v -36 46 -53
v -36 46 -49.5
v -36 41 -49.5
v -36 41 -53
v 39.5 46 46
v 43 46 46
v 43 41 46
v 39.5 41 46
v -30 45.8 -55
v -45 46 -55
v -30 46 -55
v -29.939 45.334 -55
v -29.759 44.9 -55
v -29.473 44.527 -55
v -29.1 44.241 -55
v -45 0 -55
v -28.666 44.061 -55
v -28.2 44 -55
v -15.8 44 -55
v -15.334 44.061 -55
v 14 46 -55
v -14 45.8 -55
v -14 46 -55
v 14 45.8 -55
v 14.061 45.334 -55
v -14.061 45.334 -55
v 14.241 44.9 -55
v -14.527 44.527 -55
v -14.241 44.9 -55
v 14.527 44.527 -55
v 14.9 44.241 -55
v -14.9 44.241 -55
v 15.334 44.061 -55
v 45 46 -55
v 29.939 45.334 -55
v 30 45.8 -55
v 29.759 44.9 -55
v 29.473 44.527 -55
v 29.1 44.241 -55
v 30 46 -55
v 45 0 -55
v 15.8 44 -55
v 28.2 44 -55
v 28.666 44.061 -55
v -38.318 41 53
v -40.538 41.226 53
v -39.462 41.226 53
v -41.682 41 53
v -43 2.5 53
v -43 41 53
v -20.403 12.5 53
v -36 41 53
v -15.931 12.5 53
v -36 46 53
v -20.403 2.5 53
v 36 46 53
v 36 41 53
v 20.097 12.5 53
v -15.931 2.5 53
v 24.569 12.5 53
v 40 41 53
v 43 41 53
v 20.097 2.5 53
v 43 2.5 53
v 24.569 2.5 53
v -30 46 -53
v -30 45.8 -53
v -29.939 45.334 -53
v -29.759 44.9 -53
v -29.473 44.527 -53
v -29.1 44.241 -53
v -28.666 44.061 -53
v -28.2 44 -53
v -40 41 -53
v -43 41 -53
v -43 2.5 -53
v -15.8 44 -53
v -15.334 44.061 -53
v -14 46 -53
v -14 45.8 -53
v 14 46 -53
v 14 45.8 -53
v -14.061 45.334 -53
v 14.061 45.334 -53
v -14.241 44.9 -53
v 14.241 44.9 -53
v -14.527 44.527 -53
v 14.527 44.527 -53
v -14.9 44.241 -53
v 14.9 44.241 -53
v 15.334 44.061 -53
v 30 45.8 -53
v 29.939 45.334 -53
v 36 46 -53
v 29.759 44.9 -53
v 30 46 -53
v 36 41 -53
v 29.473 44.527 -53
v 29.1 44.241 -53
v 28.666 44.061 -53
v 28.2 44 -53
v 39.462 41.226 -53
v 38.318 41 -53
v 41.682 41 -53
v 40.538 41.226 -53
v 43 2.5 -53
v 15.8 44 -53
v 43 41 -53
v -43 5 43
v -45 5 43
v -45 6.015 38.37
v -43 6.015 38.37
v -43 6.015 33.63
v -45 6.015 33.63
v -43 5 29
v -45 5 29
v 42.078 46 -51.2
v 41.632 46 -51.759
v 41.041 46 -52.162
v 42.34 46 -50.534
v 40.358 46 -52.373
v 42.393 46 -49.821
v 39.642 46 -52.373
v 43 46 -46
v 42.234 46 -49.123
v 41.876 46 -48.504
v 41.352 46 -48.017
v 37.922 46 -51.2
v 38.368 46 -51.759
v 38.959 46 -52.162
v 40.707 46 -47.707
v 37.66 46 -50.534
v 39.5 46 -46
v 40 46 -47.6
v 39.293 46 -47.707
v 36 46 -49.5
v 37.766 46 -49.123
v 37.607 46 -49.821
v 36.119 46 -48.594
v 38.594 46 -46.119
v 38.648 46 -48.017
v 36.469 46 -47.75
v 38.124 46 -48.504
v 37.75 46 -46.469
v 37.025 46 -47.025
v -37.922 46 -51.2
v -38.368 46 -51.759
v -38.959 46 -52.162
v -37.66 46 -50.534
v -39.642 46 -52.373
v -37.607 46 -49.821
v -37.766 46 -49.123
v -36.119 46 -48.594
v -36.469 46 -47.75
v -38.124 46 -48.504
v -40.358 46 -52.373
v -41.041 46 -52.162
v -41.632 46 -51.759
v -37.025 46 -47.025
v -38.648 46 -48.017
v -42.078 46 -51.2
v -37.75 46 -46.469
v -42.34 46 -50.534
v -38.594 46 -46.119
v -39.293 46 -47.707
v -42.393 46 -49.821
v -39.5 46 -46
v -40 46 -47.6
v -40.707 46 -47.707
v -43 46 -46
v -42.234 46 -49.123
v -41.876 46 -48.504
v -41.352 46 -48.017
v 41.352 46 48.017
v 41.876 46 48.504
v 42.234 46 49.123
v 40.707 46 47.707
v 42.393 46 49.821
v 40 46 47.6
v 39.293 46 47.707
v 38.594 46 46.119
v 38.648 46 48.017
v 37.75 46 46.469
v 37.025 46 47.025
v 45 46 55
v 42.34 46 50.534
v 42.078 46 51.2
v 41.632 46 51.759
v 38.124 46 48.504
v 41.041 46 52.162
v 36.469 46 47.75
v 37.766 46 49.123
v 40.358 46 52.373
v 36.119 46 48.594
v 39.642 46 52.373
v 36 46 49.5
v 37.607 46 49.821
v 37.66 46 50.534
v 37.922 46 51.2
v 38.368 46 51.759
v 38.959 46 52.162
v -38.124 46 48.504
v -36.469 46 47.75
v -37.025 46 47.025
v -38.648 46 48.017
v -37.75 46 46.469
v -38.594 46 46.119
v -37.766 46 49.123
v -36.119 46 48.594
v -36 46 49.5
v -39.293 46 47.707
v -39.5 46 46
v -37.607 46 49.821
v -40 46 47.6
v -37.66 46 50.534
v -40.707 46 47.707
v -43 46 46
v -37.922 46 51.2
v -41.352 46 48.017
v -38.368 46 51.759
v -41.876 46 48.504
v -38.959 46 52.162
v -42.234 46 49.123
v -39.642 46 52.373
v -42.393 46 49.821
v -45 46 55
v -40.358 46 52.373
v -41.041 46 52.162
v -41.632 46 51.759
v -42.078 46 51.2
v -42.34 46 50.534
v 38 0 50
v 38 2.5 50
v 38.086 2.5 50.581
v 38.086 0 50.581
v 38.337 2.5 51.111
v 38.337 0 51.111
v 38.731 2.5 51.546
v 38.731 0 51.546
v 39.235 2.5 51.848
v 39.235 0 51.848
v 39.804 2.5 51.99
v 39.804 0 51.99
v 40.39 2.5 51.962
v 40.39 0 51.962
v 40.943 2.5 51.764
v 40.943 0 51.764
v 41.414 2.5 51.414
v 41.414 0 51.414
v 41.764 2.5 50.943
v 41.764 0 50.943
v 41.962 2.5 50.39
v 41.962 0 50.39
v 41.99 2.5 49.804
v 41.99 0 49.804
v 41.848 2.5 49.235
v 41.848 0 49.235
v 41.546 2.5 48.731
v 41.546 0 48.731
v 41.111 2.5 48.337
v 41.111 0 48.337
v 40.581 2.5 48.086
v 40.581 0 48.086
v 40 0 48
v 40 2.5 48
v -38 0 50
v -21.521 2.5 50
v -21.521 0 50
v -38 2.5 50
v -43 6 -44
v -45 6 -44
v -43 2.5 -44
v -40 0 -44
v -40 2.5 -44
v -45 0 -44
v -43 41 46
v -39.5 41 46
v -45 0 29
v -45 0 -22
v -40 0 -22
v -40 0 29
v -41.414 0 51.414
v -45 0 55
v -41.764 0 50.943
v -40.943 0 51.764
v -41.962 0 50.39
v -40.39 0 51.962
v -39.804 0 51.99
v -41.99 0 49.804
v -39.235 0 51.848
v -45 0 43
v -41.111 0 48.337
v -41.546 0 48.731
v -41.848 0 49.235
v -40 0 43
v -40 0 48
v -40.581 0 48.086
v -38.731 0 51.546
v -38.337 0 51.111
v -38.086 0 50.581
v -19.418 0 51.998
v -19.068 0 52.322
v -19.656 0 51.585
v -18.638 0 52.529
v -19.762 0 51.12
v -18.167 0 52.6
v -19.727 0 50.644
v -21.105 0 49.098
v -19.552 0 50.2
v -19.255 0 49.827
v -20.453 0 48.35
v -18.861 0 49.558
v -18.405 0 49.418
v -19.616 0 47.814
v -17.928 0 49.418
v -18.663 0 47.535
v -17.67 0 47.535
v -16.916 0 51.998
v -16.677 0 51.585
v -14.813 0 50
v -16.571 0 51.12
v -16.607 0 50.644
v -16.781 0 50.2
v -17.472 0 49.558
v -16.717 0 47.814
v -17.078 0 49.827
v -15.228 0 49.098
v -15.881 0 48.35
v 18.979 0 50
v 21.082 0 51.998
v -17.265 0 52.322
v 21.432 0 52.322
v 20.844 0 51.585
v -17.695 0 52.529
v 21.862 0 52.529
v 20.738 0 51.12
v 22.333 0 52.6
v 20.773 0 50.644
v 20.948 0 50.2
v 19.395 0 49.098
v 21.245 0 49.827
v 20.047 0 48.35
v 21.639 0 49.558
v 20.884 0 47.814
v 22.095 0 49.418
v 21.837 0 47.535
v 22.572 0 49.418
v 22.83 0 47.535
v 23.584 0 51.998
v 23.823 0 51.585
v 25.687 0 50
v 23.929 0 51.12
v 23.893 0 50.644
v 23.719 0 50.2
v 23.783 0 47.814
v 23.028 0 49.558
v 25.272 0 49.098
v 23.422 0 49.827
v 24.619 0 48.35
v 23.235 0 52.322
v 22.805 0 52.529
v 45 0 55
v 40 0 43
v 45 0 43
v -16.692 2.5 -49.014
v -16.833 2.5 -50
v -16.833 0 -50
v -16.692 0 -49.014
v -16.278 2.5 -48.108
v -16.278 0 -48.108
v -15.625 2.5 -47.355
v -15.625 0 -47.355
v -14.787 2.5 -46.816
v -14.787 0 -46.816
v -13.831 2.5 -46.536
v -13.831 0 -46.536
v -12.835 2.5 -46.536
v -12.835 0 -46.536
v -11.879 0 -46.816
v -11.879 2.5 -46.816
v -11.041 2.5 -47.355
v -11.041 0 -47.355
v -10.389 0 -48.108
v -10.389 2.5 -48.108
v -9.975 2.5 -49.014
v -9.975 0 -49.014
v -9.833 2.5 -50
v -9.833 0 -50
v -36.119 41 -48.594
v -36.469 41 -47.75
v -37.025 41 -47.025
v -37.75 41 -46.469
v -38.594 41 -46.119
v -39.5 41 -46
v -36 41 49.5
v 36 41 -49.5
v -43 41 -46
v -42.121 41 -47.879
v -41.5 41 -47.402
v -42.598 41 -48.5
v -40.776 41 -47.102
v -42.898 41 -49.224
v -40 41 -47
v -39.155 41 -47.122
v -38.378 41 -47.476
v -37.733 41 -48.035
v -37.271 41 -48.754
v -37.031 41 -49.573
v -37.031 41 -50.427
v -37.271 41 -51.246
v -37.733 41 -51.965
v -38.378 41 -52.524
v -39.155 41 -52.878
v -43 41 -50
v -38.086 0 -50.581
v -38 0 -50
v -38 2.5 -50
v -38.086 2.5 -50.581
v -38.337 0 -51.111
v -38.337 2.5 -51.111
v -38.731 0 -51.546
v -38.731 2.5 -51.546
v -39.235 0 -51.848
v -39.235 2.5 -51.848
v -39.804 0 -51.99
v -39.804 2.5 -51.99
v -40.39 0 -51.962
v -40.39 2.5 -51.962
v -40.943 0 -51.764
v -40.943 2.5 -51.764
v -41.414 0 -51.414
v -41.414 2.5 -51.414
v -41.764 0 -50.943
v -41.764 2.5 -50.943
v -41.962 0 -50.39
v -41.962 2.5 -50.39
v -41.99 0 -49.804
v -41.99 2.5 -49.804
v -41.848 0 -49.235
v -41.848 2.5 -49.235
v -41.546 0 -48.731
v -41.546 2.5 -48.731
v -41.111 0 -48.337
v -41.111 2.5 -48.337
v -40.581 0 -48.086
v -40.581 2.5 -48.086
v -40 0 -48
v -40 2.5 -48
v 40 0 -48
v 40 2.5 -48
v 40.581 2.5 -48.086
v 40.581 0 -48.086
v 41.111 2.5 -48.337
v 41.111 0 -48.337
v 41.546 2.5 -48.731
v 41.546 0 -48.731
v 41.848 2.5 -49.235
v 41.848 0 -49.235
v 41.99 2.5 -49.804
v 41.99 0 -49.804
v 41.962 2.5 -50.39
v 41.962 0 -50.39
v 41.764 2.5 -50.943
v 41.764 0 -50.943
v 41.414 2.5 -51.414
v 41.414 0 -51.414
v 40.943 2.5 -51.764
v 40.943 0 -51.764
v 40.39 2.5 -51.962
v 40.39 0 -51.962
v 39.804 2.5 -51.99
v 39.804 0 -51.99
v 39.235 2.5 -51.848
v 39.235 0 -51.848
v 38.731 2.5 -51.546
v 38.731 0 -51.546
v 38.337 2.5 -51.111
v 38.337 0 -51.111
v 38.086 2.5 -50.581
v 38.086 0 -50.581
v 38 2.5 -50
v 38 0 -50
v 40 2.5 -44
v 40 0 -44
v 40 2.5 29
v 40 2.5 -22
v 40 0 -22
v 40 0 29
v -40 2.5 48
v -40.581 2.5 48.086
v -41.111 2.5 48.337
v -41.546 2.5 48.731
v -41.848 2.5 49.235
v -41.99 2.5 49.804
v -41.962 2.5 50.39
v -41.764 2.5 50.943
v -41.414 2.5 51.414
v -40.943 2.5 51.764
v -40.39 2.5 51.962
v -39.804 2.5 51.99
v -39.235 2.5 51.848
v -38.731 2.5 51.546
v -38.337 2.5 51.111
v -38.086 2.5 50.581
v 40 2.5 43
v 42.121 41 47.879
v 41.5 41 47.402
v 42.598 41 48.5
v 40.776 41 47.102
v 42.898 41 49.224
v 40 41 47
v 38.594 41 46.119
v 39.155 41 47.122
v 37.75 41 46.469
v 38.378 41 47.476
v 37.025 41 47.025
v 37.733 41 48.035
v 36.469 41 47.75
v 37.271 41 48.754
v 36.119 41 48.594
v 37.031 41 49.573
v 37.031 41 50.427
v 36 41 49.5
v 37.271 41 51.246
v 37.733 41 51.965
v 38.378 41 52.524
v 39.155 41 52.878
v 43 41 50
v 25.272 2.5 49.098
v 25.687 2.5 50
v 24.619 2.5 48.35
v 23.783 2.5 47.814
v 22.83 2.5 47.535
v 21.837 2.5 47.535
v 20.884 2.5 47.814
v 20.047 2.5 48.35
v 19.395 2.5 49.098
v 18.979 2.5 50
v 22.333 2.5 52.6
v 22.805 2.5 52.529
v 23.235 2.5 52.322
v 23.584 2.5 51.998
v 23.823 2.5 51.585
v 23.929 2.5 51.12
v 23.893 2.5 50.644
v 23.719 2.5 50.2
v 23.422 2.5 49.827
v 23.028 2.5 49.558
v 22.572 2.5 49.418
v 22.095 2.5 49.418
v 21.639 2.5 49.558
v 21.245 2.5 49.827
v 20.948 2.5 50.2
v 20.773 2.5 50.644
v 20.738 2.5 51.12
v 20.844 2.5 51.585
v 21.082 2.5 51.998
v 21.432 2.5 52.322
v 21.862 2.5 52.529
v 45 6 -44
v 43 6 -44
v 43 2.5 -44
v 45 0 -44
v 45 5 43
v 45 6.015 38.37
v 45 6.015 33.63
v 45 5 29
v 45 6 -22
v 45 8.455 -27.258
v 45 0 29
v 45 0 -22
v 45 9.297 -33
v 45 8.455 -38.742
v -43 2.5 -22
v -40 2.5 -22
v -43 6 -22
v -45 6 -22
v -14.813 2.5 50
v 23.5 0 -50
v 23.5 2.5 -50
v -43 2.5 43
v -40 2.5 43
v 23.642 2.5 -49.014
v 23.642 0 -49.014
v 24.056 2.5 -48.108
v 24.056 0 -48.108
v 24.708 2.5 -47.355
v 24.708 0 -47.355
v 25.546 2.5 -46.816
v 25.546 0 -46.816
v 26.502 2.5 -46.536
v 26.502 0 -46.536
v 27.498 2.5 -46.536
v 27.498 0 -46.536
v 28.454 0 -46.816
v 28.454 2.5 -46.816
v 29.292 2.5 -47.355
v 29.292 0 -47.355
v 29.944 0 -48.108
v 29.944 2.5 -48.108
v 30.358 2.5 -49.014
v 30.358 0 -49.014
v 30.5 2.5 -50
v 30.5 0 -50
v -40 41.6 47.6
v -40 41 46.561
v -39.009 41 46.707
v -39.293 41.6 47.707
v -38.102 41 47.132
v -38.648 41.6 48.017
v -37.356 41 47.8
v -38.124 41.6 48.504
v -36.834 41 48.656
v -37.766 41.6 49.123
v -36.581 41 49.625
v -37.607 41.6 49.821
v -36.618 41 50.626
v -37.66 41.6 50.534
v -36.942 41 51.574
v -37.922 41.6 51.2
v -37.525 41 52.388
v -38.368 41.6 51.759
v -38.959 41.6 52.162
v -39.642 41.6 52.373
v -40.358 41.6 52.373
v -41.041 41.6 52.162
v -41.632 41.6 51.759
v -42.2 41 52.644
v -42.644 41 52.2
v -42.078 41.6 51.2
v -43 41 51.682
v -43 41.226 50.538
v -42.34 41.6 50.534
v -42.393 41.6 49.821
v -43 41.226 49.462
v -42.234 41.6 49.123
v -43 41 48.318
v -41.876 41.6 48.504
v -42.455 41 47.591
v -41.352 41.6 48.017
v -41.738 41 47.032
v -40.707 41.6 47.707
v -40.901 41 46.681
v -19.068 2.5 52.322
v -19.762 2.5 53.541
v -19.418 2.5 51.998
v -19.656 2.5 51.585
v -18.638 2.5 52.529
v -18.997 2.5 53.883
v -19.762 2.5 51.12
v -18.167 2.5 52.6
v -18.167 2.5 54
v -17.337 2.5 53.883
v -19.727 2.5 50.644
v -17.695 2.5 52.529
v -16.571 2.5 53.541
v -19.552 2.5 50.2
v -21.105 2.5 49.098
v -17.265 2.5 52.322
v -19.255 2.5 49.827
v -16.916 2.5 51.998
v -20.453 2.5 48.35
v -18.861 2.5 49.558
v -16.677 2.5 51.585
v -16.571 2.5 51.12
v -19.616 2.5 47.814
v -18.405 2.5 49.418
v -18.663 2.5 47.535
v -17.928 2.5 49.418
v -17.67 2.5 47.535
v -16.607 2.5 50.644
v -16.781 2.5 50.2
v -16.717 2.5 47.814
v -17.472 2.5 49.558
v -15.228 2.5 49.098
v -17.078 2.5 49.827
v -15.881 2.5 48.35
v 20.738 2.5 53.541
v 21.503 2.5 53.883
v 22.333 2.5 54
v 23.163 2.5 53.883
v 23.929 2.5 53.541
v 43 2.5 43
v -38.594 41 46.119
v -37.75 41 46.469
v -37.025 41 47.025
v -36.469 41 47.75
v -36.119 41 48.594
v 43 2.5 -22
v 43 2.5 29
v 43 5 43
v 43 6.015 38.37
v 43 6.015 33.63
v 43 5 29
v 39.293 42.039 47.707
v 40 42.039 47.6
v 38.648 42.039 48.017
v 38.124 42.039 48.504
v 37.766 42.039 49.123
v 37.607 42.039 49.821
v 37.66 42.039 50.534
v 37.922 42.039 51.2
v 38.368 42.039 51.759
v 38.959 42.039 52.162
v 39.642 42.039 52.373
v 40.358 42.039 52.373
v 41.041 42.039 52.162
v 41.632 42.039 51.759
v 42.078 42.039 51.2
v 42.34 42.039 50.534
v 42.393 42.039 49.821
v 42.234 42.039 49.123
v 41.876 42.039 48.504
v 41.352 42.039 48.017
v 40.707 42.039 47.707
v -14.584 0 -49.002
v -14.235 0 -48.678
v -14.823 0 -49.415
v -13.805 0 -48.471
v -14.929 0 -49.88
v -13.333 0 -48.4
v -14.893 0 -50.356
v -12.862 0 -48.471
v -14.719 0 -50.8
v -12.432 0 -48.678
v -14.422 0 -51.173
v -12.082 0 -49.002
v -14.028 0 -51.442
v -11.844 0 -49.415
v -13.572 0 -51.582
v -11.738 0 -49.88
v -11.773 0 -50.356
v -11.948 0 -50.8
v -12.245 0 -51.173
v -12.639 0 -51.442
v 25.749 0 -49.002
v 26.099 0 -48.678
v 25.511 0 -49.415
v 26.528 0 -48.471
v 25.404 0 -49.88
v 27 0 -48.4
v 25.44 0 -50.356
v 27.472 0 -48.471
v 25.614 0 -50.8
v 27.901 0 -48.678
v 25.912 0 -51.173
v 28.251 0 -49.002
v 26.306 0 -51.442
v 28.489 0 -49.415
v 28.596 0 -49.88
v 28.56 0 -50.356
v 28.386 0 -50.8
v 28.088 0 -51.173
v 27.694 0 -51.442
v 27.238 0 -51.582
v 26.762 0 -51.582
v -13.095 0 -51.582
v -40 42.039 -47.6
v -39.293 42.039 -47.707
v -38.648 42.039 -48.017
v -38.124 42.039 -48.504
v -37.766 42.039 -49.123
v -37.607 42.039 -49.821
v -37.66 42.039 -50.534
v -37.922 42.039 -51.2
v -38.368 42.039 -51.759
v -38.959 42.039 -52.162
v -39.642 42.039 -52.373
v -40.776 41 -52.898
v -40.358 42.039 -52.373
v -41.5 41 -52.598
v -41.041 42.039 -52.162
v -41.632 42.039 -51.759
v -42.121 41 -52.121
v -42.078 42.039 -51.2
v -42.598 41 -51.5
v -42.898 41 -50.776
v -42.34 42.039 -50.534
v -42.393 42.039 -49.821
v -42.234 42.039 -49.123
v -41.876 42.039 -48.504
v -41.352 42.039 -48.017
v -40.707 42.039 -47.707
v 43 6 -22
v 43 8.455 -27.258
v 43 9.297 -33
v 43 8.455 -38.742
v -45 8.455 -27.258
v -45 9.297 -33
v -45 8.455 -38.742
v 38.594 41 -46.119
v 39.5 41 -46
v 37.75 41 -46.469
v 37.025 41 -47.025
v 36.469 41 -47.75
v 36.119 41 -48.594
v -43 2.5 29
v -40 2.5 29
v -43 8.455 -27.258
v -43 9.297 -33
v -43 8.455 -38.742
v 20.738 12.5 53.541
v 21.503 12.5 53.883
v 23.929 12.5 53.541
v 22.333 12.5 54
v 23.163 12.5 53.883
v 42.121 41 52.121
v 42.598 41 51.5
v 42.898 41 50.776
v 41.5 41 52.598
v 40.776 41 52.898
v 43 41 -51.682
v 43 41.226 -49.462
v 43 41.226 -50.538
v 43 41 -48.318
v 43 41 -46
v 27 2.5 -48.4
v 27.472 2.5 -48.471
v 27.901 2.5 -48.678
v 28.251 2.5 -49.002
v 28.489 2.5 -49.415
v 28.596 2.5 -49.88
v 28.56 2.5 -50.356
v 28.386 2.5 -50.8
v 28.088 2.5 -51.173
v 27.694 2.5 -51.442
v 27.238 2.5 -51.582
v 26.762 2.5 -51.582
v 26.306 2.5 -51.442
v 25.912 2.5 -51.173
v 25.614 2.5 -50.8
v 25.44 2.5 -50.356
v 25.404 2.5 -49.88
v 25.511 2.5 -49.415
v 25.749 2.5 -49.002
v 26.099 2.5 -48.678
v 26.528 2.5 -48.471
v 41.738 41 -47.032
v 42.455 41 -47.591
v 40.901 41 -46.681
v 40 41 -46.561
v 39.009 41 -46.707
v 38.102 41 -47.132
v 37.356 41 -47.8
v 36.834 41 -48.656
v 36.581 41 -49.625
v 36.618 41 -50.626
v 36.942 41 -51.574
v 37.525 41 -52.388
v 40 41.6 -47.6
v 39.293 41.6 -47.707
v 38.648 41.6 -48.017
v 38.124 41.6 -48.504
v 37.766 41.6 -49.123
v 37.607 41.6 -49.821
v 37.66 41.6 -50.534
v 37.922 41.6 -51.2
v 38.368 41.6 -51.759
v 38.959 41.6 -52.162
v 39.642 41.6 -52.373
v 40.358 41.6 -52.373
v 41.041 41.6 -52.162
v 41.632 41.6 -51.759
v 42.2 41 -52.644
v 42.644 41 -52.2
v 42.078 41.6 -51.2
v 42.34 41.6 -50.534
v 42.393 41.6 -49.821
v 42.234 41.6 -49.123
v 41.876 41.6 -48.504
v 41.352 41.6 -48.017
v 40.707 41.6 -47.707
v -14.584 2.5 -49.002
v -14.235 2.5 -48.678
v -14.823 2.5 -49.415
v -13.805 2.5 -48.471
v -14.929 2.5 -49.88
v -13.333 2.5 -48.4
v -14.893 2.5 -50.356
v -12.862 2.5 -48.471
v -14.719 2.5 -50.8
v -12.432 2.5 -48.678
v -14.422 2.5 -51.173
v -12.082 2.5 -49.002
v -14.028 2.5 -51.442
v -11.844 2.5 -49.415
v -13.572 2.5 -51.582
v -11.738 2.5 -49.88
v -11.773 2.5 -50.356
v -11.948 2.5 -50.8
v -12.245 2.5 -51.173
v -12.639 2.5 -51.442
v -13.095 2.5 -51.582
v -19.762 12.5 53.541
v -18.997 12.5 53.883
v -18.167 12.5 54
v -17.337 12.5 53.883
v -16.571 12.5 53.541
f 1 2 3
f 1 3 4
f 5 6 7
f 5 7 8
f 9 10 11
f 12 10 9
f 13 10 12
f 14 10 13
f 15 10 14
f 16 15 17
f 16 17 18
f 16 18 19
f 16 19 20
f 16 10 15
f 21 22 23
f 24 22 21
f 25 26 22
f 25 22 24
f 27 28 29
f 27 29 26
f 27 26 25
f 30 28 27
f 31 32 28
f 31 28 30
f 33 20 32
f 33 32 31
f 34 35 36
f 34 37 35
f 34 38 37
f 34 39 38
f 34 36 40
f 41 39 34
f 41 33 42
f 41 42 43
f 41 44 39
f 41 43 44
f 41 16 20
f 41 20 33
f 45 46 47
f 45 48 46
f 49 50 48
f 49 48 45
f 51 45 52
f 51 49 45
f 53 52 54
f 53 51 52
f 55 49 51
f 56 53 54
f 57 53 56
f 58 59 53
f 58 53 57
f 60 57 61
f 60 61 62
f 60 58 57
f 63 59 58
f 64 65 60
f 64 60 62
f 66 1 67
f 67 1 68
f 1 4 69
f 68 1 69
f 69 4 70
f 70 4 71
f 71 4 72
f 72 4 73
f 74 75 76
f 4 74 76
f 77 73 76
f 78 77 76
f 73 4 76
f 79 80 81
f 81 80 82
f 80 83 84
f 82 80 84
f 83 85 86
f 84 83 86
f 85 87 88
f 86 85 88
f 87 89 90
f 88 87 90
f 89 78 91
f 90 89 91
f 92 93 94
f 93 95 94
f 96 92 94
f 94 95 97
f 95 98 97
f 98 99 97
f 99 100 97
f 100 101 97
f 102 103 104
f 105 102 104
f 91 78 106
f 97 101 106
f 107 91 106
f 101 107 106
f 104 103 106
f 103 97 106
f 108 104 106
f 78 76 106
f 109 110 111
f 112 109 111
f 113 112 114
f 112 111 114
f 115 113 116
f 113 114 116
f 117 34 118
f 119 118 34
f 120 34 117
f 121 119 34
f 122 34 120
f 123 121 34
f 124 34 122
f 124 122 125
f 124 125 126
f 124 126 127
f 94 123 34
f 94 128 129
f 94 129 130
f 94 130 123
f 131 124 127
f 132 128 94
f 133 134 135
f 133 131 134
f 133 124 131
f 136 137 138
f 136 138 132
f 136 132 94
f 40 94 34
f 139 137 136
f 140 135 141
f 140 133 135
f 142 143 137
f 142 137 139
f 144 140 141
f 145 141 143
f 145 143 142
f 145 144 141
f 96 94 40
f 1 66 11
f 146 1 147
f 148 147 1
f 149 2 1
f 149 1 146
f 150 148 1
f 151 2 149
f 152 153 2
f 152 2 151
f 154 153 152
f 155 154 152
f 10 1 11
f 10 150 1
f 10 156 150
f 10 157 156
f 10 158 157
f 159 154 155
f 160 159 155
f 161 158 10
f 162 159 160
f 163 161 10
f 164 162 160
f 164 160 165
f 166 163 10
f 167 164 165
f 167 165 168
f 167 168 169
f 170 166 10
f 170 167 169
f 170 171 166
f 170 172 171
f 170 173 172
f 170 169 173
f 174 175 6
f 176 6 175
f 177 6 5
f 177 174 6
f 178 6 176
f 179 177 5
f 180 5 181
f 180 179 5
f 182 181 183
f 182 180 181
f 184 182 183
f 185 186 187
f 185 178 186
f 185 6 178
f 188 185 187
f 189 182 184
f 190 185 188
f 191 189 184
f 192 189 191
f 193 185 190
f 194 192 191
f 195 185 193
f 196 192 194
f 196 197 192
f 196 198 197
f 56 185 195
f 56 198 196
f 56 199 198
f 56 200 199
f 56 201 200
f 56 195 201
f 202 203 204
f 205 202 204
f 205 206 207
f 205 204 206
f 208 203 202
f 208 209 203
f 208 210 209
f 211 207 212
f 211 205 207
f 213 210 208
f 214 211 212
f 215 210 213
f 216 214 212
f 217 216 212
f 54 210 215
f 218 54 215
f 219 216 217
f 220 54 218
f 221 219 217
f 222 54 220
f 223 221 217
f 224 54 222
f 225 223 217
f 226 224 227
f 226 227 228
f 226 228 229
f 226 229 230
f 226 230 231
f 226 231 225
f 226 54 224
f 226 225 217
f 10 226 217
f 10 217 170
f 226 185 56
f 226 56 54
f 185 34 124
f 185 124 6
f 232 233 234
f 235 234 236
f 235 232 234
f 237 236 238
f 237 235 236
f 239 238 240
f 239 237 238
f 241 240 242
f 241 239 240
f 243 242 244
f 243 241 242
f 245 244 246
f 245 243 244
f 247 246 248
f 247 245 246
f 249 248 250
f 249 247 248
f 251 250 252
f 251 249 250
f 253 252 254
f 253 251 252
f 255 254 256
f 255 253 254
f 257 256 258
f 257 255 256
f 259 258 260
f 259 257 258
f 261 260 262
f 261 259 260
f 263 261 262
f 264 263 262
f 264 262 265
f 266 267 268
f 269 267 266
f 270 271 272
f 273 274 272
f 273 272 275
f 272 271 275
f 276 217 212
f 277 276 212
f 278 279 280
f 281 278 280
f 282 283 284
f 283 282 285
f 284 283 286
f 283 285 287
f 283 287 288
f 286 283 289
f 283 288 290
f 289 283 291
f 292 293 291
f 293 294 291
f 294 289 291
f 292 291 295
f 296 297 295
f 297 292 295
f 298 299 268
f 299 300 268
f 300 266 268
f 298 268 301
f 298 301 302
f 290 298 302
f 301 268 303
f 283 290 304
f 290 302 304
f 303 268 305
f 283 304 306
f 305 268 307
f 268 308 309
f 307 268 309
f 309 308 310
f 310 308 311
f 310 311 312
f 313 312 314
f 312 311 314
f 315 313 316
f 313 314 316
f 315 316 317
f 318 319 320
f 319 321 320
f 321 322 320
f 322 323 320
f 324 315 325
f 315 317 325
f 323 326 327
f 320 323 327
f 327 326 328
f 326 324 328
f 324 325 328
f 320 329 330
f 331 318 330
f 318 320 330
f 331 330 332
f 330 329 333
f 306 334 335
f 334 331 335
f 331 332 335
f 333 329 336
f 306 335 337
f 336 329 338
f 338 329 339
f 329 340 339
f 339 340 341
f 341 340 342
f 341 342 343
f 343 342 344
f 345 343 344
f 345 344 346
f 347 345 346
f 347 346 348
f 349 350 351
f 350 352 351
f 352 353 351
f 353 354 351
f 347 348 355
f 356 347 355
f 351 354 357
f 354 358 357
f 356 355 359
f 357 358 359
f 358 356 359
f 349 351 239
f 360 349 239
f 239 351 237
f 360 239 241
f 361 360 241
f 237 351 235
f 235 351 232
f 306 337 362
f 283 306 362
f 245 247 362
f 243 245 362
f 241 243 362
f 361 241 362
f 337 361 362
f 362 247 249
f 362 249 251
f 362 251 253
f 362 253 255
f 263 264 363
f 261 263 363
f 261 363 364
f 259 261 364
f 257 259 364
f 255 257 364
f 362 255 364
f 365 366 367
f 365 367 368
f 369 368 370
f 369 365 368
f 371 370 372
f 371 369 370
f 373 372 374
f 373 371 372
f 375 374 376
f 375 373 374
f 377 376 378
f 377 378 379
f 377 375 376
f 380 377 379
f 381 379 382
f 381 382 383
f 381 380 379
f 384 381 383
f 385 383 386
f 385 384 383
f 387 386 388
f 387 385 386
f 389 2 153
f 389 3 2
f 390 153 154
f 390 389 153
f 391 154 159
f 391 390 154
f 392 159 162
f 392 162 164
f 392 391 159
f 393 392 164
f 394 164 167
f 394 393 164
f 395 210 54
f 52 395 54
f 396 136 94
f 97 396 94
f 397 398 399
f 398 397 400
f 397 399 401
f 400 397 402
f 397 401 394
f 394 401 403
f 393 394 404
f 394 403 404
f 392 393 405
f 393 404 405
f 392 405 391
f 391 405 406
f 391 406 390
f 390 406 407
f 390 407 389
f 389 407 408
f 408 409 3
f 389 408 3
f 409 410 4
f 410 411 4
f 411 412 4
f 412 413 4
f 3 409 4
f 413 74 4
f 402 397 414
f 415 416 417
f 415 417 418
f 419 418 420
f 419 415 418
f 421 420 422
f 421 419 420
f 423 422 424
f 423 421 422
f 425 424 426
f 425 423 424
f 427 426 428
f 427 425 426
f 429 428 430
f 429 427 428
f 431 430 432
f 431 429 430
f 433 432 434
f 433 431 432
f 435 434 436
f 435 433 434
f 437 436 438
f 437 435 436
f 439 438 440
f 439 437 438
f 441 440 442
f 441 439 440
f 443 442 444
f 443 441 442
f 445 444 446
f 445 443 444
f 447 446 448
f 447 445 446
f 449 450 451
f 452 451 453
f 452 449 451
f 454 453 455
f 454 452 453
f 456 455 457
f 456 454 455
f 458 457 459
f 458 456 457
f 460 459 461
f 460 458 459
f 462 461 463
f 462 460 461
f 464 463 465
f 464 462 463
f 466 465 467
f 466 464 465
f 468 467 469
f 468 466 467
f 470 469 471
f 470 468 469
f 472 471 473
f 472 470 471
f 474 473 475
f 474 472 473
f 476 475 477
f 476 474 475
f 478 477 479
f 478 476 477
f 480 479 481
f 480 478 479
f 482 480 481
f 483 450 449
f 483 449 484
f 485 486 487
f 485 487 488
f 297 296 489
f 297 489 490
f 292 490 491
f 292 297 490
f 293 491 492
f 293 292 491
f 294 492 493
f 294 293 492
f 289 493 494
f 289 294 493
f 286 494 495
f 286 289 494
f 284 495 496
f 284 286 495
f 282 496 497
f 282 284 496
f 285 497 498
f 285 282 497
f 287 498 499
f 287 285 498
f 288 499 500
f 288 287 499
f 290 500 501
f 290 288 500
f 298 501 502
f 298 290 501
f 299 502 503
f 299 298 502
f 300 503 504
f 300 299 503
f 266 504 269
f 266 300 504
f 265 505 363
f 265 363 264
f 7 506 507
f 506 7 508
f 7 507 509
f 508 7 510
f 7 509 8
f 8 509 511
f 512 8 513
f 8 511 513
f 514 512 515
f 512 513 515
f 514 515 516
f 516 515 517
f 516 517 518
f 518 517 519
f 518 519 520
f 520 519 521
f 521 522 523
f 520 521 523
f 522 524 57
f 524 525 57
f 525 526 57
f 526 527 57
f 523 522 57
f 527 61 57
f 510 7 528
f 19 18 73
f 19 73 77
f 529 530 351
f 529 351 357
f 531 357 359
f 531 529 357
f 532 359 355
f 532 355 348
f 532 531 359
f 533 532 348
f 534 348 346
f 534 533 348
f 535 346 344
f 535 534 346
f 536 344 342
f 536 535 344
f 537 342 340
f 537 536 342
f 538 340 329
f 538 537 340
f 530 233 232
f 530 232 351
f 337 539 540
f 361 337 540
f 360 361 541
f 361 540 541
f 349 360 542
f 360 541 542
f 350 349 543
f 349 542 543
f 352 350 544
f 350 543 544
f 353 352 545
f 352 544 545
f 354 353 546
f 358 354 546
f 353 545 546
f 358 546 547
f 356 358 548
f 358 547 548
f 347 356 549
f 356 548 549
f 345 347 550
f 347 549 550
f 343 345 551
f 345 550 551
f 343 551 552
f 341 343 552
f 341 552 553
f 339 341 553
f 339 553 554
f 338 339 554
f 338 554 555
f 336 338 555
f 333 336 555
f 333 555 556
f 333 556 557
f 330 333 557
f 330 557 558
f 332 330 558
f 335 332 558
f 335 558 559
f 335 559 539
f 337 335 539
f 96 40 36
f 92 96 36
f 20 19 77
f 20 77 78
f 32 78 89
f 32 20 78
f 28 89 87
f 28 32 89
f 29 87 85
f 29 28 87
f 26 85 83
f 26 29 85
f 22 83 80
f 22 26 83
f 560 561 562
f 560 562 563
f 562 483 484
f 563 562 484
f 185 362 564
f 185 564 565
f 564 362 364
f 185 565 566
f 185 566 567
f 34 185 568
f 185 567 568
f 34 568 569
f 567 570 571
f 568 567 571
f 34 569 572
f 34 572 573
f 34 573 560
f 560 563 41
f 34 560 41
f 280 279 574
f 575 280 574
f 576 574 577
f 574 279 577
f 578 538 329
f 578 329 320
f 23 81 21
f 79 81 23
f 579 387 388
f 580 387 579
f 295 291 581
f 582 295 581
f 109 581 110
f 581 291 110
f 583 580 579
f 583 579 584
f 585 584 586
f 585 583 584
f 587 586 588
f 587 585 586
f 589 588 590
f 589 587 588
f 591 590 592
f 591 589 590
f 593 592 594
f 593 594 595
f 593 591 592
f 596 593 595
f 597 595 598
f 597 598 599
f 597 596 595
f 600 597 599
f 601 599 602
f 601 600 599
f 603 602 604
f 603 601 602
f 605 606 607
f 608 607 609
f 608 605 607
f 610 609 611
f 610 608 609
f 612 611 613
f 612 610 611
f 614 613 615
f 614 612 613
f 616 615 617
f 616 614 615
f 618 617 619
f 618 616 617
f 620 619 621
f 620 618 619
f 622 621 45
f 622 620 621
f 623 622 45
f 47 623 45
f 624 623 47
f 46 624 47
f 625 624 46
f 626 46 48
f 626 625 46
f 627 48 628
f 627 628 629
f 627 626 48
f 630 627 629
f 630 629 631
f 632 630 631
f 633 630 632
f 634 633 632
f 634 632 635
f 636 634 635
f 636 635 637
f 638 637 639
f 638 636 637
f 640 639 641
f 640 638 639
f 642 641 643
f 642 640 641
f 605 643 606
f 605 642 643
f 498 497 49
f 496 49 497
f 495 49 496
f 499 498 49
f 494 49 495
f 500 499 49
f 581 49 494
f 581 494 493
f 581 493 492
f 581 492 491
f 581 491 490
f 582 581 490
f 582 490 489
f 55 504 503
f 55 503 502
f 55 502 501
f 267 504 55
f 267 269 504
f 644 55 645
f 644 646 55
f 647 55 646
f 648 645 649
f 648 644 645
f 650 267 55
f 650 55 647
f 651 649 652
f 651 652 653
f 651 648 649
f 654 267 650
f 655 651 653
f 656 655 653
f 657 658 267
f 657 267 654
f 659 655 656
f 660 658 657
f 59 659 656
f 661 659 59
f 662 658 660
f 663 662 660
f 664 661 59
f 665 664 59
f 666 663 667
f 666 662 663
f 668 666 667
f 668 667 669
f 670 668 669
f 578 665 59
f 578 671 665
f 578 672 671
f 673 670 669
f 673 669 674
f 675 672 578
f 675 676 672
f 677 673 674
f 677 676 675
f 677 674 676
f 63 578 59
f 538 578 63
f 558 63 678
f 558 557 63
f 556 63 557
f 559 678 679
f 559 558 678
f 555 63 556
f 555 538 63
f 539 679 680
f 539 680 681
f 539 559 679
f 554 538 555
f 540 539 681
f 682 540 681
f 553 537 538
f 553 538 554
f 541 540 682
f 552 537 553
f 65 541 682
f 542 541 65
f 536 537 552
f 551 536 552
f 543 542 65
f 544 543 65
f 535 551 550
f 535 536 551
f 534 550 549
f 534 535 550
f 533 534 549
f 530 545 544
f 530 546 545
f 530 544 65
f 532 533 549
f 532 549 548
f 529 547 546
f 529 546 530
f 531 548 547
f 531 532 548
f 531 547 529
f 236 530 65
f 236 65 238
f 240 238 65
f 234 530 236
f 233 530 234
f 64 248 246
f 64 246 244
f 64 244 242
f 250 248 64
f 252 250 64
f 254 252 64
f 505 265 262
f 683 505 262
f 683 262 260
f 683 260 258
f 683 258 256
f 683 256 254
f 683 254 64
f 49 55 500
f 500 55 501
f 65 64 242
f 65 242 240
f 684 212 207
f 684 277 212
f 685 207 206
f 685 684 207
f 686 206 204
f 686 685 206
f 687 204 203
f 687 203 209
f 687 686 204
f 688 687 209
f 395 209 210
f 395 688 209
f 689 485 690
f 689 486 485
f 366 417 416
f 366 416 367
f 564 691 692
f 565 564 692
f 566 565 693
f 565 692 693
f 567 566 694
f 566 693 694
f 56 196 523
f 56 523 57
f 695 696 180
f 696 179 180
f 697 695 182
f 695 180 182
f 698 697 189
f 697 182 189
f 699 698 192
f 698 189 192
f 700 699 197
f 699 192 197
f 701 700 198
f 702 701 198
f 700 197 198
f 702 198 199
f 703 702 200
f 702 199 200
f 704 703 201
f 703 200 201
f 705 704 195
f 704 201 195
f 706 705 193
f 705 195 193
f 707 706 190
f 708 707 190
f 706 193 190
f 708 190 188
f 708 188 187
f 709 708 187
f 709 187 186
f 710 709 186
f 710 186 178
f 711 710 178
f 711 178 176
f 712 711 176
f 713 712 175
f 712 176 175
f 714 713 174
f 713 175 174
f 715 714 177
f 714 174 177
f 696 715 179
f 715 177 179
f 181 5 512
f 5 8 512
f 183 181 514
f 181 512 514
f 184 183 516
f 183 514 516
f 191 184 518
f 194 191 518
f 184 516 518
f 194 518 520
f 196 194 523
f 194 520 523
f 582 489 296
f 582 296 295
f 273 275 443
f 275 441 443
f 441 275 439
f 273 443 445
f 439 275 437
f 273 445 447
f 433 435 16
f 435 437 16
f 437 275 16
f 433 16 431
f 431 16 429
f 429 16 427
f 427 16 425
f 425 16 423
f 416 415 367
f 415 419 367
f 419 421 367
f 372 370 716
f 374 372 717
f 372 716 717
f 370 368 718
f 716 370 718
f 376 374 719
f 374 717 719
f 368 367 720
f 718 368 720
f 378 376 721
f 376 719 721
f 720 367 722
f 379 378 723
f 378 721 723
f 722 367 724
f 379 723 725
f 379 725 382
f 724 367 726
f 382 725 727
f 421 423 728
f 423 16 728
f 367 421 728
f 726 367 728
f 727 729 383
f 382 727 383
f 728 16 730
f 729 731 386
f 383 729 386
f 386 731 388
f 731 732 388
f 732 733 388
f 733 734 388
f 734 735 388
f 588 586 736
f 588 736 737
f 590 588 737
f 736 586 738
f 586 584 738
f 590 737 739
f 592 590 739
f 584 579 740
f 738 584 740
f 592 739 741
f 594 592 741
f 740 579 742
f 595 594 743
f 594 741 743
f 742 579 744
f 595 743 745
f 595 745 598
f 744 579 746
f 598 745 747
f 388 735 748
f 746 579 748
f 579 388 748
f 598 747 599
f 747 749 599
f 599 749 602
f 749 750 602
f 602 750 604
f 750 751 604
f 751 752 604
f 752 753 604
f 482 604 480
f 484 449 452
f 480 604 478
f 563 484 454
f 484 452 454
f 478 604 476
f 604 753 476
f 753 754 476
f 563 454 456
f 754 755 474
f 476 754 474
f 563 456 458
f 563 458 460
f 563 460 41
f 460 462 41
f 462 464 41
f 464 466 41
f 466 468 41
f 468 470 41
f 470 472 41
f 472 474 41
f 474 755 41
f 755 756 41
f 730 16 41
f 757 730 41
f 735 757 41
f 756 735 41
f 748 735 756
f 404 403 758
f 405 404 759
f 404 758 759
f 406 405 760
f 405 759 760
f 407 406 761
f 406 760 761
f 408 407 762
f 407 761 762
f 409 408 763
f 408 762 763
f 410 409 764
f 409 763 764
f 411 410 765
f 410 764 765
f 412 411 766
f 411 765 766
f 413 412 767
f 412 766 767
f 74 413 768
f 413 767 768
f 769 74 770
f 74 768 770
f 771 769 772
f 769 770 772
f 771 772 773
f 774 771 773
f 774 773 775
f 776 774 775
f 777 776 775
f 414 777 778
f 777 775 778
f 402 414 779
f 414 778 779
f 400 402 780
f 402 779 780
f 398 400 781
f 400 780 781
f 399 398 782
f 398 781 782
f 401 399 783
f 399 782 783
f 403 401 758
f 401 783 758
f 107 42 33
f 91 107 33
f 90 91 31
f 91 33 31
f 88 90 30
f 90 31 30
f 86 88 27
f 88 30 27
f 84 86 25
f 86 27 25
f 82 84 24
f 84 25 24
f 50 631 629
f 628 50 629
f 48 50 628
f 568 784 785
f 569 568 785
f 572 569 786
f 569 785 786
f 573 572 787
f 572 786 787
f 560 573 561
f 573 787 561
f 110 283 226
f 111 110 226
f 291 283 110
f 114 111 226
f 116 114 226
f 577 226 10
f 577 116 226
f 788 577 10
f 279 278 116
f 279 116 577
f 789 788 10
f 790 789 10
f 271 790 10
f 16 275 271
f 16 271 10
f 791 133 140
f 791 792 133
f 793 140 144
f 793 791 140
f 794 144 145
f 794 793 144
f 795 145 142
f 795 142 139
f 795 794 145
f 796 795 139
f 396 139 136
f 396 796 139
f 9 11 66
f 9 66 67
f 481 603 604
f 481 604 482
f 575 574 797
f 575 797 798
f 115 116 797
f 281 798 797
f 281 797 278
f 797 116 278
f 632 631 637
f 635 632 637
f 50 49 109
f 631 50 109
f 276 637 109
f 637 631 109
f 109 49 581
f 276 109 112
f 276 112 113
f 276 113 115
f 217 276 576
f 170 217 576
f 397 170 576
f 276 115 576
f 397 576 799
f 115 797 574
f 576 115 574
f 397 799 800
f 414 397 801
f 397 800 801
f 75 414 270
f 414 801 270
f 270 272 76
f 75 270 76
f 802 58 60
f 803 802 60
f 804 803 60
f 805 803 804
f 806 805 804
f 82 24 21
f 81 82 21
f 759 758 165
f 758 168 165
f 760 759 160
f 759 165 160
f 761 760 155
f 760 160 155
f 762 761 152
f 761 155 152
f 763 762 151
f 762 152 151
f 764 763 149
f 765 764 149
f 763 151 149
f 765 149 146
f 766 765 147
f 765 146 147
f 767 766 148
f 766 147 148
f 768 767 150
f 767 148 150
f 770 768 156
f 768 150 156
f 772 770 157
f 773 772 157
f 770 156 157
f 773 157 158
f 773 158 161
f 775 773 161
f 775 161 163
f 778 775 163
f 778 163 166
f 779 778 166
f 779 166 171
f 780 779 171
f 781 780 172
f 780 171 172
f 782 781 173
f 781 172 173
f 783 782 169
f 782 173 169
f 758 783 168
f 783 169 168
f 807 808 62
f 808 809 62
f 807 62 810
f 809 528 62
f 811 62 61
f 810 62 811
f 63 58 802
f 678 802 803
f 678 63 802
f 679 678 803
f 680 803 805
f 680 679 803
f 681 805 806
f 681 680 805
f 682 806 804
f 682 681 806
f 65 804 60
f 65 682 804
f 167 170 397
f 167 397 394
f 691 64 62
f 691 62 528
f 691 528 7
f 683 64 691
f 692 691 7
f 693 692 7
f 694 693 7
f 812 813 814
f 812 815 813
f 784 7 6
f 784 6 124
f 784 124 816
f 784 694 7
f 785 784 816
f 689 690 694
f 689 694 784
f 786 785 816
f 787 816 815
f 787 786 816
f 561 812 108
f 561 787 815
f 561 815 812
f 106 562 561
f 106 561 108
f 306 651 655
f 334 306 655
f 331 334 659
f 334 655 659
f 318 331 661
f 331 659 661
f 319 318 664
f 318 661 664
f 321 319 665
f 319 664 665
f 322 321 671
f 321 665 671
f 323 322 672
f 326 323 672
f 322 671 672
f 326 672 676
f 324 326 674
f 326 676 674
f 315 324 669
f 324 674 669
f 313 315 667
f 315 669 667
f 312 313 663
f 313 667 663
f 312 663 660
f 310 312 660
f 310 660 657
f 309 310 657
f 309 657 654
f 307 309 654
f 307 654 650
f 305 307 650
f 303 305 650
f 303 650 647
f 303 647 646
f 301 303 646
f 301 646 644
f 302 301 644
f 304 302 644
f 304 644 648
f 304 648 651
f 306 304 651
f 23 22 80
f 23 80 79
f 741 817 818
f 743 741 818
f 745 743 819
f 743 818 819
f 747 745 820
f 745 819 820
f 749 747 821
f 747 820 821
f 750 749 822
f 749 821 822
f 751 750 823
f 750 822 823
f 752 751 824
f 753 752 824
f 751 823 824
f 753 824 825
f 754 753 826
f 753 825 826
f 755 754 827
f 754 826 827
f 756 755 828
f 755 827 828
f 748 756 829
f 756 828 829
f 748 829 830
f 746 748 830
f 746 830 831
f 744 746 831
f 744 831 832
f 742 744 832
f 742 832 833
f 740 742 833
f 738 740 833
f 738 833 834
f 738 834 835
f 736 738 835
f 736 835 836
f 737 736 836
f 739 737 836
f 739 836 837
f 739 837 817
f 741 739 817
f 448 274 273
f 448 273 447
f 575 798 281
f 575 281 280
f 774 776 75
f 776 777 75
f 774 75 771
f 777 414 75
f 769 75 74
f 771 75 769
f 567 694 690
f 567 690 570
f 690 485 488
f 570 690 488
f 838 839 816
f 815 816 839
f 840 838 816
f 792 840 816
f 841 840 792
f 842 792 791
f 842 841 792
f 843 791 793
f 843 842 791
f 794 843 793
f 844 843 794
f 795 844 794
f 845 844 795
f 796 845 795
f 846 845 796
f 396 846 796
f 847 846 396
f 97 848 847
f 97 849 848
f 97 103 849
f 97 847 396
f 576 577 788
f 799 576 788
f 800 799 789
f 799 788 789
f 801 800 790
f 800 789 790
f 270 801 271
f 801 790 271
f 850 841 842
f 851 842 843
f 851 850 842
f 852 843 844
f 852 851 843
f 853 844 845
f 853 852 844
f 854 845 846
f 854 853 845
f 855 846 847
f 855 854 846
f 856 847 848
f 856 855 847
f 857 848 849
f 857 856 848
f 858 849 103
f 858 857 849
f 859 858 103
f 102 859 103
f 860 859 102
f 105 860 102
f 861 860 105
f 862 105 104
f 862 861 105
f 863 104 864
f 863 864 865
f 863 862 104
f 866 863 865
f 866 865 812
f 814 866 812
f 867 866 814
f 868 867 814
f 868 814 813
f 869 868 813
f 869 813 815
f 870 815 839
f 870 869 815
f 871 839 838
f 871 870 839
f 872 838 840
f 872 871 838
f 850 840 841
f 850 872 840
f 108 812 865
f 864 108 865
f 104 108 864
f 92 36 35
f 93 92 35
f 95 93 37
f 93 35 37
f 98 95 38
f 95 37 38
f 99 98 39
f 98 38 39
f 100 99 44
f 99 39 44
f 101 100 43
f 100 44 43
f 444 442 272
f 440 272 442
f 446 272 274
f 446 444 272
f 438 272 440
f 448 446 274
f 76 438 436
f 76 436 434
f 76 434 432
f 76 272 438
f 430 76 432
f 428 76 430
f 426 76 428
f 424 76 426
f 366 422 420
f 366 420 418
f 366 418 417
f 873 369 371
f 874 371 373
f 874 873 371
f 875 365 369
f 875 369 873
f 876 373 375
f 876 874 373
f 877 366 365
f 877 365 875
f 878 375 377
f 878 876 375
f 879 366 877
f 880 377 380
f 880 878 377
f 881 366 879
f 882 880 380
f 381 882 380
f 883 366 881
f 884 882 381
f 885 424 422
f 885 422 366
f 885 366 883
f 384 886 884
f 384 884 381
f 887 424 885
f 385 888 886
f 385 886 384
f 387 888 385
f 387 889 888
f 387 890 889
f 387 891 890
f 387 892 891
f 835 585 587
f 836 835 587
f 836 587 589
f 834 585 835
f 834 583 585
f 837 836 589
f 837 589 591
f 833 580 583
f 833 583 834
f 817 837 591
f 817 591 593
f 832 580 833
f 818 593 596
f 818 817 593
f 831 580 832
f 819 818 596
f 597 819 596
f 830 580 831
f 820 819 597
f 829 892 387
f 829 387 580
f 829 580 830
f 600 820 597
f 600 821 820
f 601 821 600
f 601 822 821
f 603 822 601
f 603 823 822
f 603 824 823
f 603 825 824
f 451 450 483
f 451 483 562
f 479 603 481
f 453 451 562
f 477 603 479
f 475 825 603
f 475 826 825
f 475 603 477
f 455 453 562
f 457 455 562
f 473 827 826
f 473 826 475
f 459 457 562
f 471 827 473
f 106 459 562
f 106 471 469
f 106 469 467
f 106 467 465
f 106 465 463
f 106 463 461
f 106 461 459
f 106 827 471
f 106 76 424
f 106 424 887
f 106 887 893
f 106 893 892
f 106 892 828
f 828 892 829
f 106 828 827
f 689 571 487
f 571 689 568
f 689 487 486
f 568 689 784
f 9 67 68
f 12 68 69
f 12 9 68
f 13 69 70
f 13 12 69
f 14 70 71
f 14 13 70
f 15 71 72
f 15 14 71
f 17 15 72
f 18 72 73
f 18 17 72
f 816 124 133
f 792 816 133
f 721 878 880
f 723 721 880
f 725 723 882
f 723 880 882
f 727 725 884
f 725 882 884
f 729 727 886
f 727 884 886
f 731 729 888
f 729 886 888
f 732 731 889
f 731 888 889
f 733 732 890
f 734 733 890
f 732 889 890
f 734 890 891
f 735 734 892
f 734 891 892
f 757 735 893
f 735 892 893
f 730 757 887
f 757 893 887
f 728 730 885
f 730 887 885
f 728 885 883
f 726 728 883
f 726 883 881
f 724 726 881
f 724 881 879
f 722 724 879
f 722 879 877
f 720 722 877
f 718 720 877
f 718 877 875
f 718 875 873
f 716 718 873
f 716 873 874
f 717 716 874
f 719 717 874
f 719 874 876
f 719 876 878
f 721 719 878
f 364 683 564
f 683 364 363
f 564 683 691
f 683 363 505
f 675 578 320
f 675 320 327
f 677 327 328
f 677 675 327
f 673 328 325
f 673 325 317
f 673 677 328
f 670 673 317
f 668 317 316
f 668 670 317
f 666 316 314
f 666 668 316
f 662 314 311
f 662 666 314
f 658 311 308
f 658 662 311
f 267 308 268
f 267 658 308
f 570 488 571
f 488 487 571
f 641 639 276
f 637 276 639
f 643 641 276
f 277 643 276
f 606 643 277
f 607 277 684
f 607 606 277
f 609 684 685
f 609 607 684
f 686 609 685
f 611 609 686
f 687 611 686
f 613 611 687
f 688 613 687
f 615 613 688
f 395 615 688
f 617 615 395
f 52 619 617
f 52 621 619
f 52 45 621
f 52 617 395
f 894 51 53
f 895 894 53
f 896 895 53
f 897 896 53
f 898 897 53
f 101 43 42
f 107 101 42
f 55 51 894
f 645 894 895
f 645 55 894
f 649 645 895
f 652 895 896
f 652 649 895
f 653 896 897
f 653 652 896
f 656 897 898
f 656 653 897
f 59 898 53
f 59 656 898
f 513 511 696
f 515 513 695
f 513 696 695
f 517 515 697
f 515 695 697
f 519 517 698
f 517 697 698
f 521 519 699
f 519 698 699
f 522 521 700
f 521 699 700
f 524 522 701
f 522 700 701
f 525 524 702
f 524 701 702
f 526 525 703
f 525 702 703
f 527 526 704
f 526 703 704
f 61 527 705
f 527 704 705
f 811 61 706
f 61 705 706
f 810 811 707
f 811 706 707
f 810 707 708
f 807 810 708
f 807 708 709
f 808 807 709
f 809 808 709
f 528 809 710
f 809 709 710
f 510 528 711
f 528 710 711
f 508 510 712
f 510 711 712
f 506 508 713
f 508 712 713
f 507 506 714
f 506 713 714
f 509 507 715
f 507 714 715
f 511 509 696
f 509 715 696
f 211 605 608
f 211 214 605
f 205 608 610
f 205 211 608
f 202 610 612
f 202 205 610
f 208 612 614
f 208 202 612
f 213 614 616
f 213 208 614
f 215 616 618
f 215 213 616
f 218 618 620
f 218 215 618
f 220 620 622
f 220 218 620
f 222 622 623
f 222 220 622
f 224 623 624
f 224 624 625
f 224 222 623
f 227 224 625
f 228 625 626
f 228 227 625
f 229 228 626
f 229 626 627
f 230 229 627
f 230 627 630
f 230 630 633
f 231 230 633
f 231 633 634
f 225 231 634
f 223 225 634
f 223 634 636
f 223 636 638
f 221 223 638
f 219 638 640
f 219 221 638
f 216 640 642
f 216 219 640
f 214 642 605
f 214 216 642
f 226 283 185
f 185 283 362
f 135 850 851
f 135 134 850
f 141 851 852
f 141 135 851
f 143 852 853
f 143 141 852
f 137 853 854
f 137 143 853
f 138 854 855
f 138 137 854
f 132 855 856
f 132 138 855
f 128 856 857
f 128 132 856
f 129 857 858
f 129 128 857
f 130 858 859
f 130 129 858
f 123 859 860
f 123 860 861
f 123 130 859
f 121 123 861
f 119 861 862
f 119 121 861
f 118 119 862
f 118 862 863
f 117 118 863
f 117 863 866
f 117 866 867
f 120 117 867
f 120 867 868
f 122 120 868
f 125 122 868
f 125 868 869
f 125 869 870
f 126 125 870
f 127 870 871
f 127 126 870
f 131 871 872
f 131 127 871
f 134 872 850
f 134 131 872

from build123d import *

# Parameters (mm, degrees)
SKETCH1_W               = 90
SKETCH1_H               = 110
BOSS_EXTRUDE1_DEPTH     = 2.5
CUT_EXTRUDE1_DEPTH      = 72.107313267
SKETCH6_R               = 1.6
CUT_EXTRUDE4_DEPTH      = 72.107313267
SKETCH3_W               = 90
SKETCH3_H               = 110
SKETCH3_W_2             = 86
SKETCH3_H_2             = 106
BOSS_EXTRUDE2_DEPTH     = 43.5
SKETCH4_W               = 7
SKETCH4_H               = 7
BOSS_EXTRUDE3_DEPTH     = 5
CUT_EXTRUDE3_REACH      = 86.652
SKETCH5_R               = 2.4
MIRROR2_COPY_1_SKETCH_W = 7
MIRROR2_COPY_1_SKETCH_H = 7
MIRROR2_COPY_1_DEPTH    = 5
MIRROR2_COPY_2_REACH    = 86.652
MIRROR2_COPY_2_SKETCH_R = 2.4
SKETCH8_R               = 3
CUT_EXTRUDE5_DEPTH      = 10
CUT_EXTRUDE6_DEPTH      = 116.06954419
CUT_EXTRUDE7_REACH      = 129.44
SKETCH12_R              = 2
CUT_EXTRUDE8_DEPTH      = 5
CHAMFER1_SIZE           = 0.6
CHAMFER1_SIZE_2         = 1.039230485
FILLET1_R               = 3.5


with BuildPart() as part:
    # Sketch1 → Boss-Extrude1 (new body)
    with BuildSketch(Plane(origin=(0, 0, 0), x_dir=(1, 0, 0), z_dir=(0, 1, 0))):
        Rectangle(SKETCH1_W, SKETCH1_H)
    extrude(amount=BOSS_EXTRUDE1_DEPTH)

    # Sketch2 → Cut-Extrude1 (cut, through all)
    with BuildSketch(Plane(origin=(0, 2.5, 0), x_dir=(1, 0, 0), z_dir=(0, 1, 0))):
        with BuildLine():
            Line((-40, 50), (-16.83333333, 50))
            ThreePointArc((-16.83333333, 50), (-13.33333333, 46.5), (-9.83333333, 50))
            Line((-9.83333333, 50), (23.5, 50))
            ThreePointArc((23.5, 50), (27, 46.5), (30.5, 50))
            Line((30.5, 50), (40, 50))
            Line((40, 50), (40, -50))
            Line((40, -50), (25.6874353, -50))
            ThreePointArc((25.6874353, -50), (22.333333333, -47.5), (18.979231367, -50))
            Line((18.979231367, -50), (-14.8125647, -50))
            ThreePointArc((-14.8125647, -50), (-18.166666667, -47.5), (-21.520768633, -50))
            Line((-21.520768633, -50), (-40, -50))
            Line((-40, -50), (-40, 50))
        make_face()
    extrude(amount=-CUT_EXTRUDE1_DEPTH, mode=Mode.SUBTRACT)

    # Sketch6 → Cut-Extrude4 (cut, through all)
    with BuildSketch(Plane(origin=(0, 2.5, 0), x_dir=(1, 0, 0), z_dir=(0, 1, 0))):
        with Locations(Location((-13.33333333, 50, 0), (0, 0, 270))):
            Circle(SKETCH6_R)
        with Locations(Location((27, 50, 0), (0, 0, 270))):
            Circle(SKETCH6_R)
        with Locations(Location((22.333333333, -51, 0), (0, 0, 270))):
            Circle(SKETCH6_R)
        with Locations(Location((-18.166666667, -51, 0), (0, 0, 270))):
            Circle(SKETCH6_R)
    extrude(amount=-CUT_EXTRUDE4_DEPTH, mode=Mode.SUBTRACT)

    # Sketch3 → Boss-Extrude2 (add)
    with BuildSketch(Plane(origin=(0, 2.5, 0), x_dir=(1, 0, 0), z_dir=(0, 1, 0))):
        Rectangle(SKETCH3_W, SKETCH3_H)
        Rectangle(SKETCH3_W_2, SKETCH3_H_2, mode=Mode.SUBTRACT)
    extrude(amount=BOSS_EXTRUDE2_DEPTH)

    # Sketch4 → Boss-Extrude3 (add)
    with BuildSketch(Plane(origin=(0, 46, 0), x_dir=(1, 0, 0), z_dir=(0, 1, 0))):
        with Locations((-39.5, 49.5)):
            Rectangle(SKETCH4_W, SKETCH4_H)
    boss_extrude3 = extrude(amount=-BOSS_EXTRUDE3_DEPTH)

    # Sketch5 → Cut-Extrude3 (cut, up to next)
    with BuildSketch(Plane(origin=(0, 46, 0), x_dir=(1, 0, 0), z_dir=(0, 1, 0)), mode=Mode.PRIVATE) as cut_extrude3_sk1:
        with Locations(Location((-40, 50, 0), (0, 0, 270))):
            Circle(SKETCH5_R)
    cut_extrude3_tool1 = extrude(cut_extrude3_sk1.sketch, amount=-CUT_EXTRUDE3_REACH, mode=Mode.PRIVATE) & part.part
    cut_extrude3 = cut_extrude3_tool1.solids().sort_by_distance((-40, 46, -50))[0]
    add(cut_extrude3, mode=Mode.SUBTRACT)

    # Mirror1: Boss-Extrude3, Cut-Extrude3 across plane
    add(boss_extrude3.mirror(Plane(origin=(0, 0, 0), x_dir=(0, 0, 1), z_dir=(1, 0, 0))))
    add(cut_extrude3.mirror(Plane(origin=(0, 0, 0), x_dir=(0, 0, 1), z_dir=(1, 0, 0))), mode=Mode.SUBTRACT)

    # Mirror2: Boss-Extrude3, Cut-Extrude3 across plane
    add(boss_extrude3.mirror(Plane.XY))
    add(cut_extrude3.mirror(Plane.XY), mode=Mode.SUBTRACT)

    # Mirror2 copy 1 sketch → Mirror2 copy 1 (add)
    with BuildSketch(Plane(origin=(0, 46, 0), x_dir=(-1, 0, 0), z_dir=(0, 1, 0))):
        with Locations((-39.5, 49.5)):
            Rectangle(MIRROR2_COPY_1_SKETCH_W, MIRROR2_COPY_1_SKETCH_H)
    extrude(amount=-MIRROR2_COPY_1_DEPTH)

    # Mirror2 copy 2 sketch → Mirror2 copy 2 (cut, up to next)
    with BuildSketch(Plane(origin=(0, 46, 0), x_dir=(-1, 0, 0), z_dir=(0, 1, 0)), mode=Mode.PRIVATE) as mirror2_copy_2_sk1:
        with Locations(Location((-40, 50, 0), (0, 0, 270))):
            Circle(MIRROR2_COPY_2_SKETCH_R)
    mirror2_copy_2_tool1 = extrude(mirror2_copy_2_sk1.sketch, amount=-MIRROR2_COPY_2_REACH, mode=Mode.PRIVATE) & part.part
    add(mirror2_copy_2_tool1.solids().sort_by_distance((40, 46, 50))[0], mode=Mode.SUBTRACT)

    # Sketch8 → Cut-Extrude5 (cut)
    with BuildSketch(Plane(origin=(0, 2.5, 0), x_dir=(1, 0, 0), z_dir=(0, 1, 0))):
        with Locations((-18.166666667, -51)):
            Circle(SKETCH8_R)
        with Locations((22.333333333, -51)):
            Circle(SKETCH8_R)
    extrude(amount=CUT_EXTRUDE5_DEPTH, mode=Mode.SUBTRACT)

    # Sketch9 → Cut-Extrude6 (cut, through all)
    with BuildSketch(Plane.ZY.offset(45)):
        with BuildLine():
            Line((-44, 6), (-44, 0))
            Line((-44, 0), (-22, 0))
            Line((-22, 0), (-22, 6))
            ThreePointArc((-22, 6), (-33, 9.296706912), (-44, 6))
        make_face()
        with BuildLine():
            Line((29, 0), (43, 0))
            Line((43, 0), (43, 5))
            ThreePointArc((43, 5), (36, 6.143346385), (29, 5))
            Line((29, 5), (29, 0))
        make_face()
    extrude(amount=-CUT_EXTRUDE6_DEPTH, mode=Mode.SUBTRACT)

    # Sketch10 → Cut-Extrude7 (cut, up to next)
    with BuildSketch(Plane(origin=(0, 0, -55), x_dir=(-1, 0, 0), z_dir=(0, 0, -1)), mode=Mode.PRIVATE) as cut_extrude7_sk1:
        with BuildLine():
            Line((14, 46), (30, 46))
            Line((30, 46), (30, 45.8))
            ThreePointArc((30, 45.8), (29.472792206, 44.527207794), (28.2, 44))
            Line((28.2, 44), (15.8, 44))
            ThreePointArc((15.8, 44), (14.527207794, 44.527207794), (14, 45.8))
            Line((14, 45.8), (14, 46))
        make_face()
    cut_extrude7_tool1 = extrude(cut_extrude7_sk1.sketch, amount=-CUT_EXTRUDE7_REACH, mode=Mode.PRIVATE) & part.part
    # Sketch10 → Cut-Extrude7 (cut, up to next)
    with BuildSketch(Plane(origin=(0, 0, -55), x_dir=(-1, 0, 0), z_dir=(0, 0, -1)), mode=Mode.PRIVATE) as cut_extrude7_sk2:
        with BuildLine():
            Line((-30, 46), (-30, 45.8))
            ThreePointArc((-30, 45.8), (-29.472792206, 44.527207794), (-28.2, 44))
            Line((-28.2, 44), (-15.8, 44))
            ThreePointArc((-15.8, 44), (-14.527207794, 44.527207794), (-14, 45.8))
            Line((-14, 45.8), (-14, 46))
            Line((-14, 46), (-30, 46))
        make_face()
    cut_extrude7_tool2 = extrude(cut_extrude7_sk2.sketch, amount=-CUT_EXTRUDE7_REACH, mode=Mode.PRIVATE) & part.part
    add(cut_extrude7_tool1.solids().sort_by_distance((-22, 45.027165, -55))[0], mode=Mode.SUBTRACT)
    add(cut_extrude7_tool2.solids().sort_by_distance((22, 45.027165, -55))[0], mode=Mode.SUBTRACT)

    # Sketch12 → Cut-Extrude8 (cut)
    with BuildSketch(Plane(origin=(0, 0, 0), x_dir=(1, 0, 0), z_dir=(0, 1, 0))):
        with Locations((-40, -50)):
            Circle(SKETCH12_R)
        with Locations((40, -50)):
            Circle(SKETCH12_R)
        with Locations((-40, 50)):
            Circle(SKETCH12_R)
        with Locations((40, 50)):
            Circle(SKETCH12_R)
    extrude(amount=CUT_EXTRUDE8_DEPTH, mode=Mode.SUBTRACT)

    # Chamfer1
    # the kernel refuses this chamfer: 1.039230485, 0.6 mm, written as the material it takes off along each edge
    with BuildSketch(Plane(origin=(-40, 41, -50), x_dir=(0, 0, 1), z_dir=(-1, 0, 0))) as chamfer1_piece_1_section:
        Polygon((2.4 + CHAMFER1_SIZE, 0), (2.4, CHAMFER1_SIZE_2), (2.4, 0), align=None)
    chamfer1_piece_1 = revolve(axis=Axis((-40, 41, -50), (0, 1, 0)), mode=Mode.PRIVATE)
    chamfer1_piece_1 = split(chamfer1_piece_1, bisect_by=Plane(origin=(-43, 41.510650162, -52.684472026), z_dir=(1, 0, 0)), keep=Keep.TOP, mode=Mode.PRIVATE)
    chamfer1_piece_1 = split(chamfer1_piece_1, bisect_by=Plane(origin=(-40, 41.510650162, -53), z_dir=(0, 0, 1)), keep=Keep.TOP, mode=Mode.PRIVATE)
    add(chamfer1_piece_1, mode=Mode.SUBTRACT)
    with BuildSketch(Plane(origin=(40, 41, -50), x_dir=(0, 0, 1), z_dir=(1, 0, 0))) as chamfer1_piece_2_section:
        Polygon((2.4 + CHAMFER1_SIZE_2, 0), (2.4, -CHAMFER1_SIZE), (2.4, 0), align=None)
    chamfer1_piece_2 = revolve(axis=Axis((40, 41, -50), (0, -1, 0)), mode=Mode.PRIVATE)
    chamfer1_piece_2 = split(chamfer1_piece_2, bisect_by=Plane(origin=(40, 41.284402775, -53), z_dir=(0, 0, 1)), keep=Keep.TOP, mode=Mode.PRIVATE)
    chamfer1_piece_2 = split(chamfer1_piece_2, bisect_by=Plane(origin=(43, 41.284402775, -52.91061018), z_dir=(-1, 0, 0)), keep=Keep.TOP, mode=Mode.PRIVATE)
    add(chamfer1_piece_2, mode=Mode.SUBTRACT)
    with BuildSketch(Plane(origin=(40, 41, 50), x_dir=(0, 0, -1), z_dir=(1, 0, 0))) as chamfer1_piece_3_section:
        Polygon((2.4 + CHAMFER1_SIZE, 0), (2.4, CHAMFER1_SIZE_2), (2.4, 0), align=None)
    chamfer1_piece_3 = revolve(axis=Axis((40, 41, 50), (0, 1, 0)), mode=Mode.PRIVATE)
    chamfer1_piece_3 = split(chamfer1_piece_3, bisect_by=Plane(origin=(43, 41.510650162, 52.684472026), z_dir=(-1, 0, 0)), keep=Keep.TOP, mode=Mode.PRIVATE)
    chamfer1_piece_3 = split(chamfer1_piece_3, bisect_by=Plane(origin=(40, 41.510650162, 53), z_dir=(0, 0, -1)), keep=Keep.TOP, mode=Mode.PRIVATE)
    add(chamfer1_piece_3, mode=Mode.SUBTRACT)
    with BuildSketch(Plane(origin=(-40, 41, 50), x_dir=(0, 0, -1), z_dir=(-1, 0, 0))) as chamfer1_piece_4_section:
        Polygon((2.4 + CHAMFER1_SIZE_2, 0), (2.4, -CHAMFER1_SIZE), (2.4, 0), align=None)
    chamfer1_piece_4 = revolve(axis=Axis((-40, 41, 50), (0, -1, 0)), mode=Mode.PRIVATE)
    chamfer1_piece_4 = split(chamfer1_piece_4, bisect_by=Plane(origin=(-43, 41.284402775, 52.91061018), z_dir=(1, 0, 0)), keep=Keep.TOP, mode=Mode.PRIVATE)
    chamfer1_piece_4 = split(chamfer1_piece_4, bisect_by=Plane(origin=(-40, 41.284402775, 53), z_dir=(0, 0, -1)), keep=Keep.TOP, mode=Mode.PRIVATE)
    add(chamfer1_piece_4, mode=Mode.SUBTRACT)

    # Fillet1
    fillet1_edges = [part.edges().sort_by_distance(p)[0] for p in [
        (36, 43.5, -46),
        (36, 43.5, 46),
        (-36, 43.5, 46),
        (-36, 43.5, -46),
    ]]
    fillet(fillet1_edges, radius=FILLET1_R)


solid = part.part
